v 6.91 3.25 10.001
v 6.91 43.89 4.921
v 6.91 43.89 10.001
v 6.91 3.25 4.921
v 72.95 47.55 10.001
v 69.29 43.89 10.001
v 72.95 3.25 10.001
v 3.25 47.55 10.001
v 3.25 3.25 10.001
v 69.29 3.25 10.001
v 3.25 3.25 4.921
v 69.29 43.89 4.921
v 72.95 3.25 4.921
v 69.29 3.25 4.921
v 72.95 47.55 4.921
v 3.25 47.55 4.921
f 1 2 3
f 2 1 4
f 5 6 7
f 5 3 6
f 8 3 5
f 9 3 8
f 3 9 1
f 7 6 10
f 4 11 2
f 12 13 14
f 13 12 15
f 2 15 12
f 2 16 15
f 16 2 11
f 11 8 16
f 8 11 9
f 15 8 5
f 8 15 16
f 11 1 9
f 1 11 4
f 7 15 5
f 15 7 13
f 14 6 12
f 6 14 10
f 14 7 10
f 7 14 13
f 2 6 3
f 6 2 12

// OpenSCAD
foot = 25.4 / 5.0; // mm per foot
mm = 1.0; // mm per mm

epsilon = 0.001;


tank_width = 2 * foot;

wall_width = 3;

tank = [15 * foot, 10 * foot, 10 * mm]; // total footprint

module tank_model() {
  cube([tank_width, tank.y, tank.z]);
  translate([tank.x - tank_width, 0, 0])
    cube([tank_width, tank.y, tank.z]);
  translate([0, tank.y - tank_width, 0])
    cube([tank.x, tank_width, tank.z]);
}


jelly_width = tank_width - 2 * wall_width;
jelly_depth = 1 * foot;


module jelly_model(tolerance=0.5) {
  translate([wall_width+tolerance/2, wall_width+tolerance/2, 0])
    cube([jelly_width - tolerance, tank.y - 2 * wall_width - tolerance, jelly_depth]);
  translate([tank.x - tank_width + wall_width+tolerance/2, wall_width+tolerance/2, 0])
    cube([jelly_width - tolerance, tank.y - 2 * wall_width - tolerance, jelly_depth]);
  translate([wall_width+tolerance/2, tank.y - tank_width + wall_width + tolerance/2, 0])
    cube([tank.x - 2 * wall_width - tolerance, jelly_width - tolerance, jelly_depth]);
}


torender = "assembly";

module render(what) {
  if (what == "assembly") {
    % tank_model();
    translate([0,0,tank.z  - jelly_depth + epsilon])
      jelly_model();
  } else if (what == "tank") {
    difference () {
      tank_model();
      translate([0,0,tank.z  - jelly_depth + epsilon])
        jelly_model(tolerance=0);
    }
  } else if (what == "jelly") {
    jelly_model();
  }
}

render(torender);
